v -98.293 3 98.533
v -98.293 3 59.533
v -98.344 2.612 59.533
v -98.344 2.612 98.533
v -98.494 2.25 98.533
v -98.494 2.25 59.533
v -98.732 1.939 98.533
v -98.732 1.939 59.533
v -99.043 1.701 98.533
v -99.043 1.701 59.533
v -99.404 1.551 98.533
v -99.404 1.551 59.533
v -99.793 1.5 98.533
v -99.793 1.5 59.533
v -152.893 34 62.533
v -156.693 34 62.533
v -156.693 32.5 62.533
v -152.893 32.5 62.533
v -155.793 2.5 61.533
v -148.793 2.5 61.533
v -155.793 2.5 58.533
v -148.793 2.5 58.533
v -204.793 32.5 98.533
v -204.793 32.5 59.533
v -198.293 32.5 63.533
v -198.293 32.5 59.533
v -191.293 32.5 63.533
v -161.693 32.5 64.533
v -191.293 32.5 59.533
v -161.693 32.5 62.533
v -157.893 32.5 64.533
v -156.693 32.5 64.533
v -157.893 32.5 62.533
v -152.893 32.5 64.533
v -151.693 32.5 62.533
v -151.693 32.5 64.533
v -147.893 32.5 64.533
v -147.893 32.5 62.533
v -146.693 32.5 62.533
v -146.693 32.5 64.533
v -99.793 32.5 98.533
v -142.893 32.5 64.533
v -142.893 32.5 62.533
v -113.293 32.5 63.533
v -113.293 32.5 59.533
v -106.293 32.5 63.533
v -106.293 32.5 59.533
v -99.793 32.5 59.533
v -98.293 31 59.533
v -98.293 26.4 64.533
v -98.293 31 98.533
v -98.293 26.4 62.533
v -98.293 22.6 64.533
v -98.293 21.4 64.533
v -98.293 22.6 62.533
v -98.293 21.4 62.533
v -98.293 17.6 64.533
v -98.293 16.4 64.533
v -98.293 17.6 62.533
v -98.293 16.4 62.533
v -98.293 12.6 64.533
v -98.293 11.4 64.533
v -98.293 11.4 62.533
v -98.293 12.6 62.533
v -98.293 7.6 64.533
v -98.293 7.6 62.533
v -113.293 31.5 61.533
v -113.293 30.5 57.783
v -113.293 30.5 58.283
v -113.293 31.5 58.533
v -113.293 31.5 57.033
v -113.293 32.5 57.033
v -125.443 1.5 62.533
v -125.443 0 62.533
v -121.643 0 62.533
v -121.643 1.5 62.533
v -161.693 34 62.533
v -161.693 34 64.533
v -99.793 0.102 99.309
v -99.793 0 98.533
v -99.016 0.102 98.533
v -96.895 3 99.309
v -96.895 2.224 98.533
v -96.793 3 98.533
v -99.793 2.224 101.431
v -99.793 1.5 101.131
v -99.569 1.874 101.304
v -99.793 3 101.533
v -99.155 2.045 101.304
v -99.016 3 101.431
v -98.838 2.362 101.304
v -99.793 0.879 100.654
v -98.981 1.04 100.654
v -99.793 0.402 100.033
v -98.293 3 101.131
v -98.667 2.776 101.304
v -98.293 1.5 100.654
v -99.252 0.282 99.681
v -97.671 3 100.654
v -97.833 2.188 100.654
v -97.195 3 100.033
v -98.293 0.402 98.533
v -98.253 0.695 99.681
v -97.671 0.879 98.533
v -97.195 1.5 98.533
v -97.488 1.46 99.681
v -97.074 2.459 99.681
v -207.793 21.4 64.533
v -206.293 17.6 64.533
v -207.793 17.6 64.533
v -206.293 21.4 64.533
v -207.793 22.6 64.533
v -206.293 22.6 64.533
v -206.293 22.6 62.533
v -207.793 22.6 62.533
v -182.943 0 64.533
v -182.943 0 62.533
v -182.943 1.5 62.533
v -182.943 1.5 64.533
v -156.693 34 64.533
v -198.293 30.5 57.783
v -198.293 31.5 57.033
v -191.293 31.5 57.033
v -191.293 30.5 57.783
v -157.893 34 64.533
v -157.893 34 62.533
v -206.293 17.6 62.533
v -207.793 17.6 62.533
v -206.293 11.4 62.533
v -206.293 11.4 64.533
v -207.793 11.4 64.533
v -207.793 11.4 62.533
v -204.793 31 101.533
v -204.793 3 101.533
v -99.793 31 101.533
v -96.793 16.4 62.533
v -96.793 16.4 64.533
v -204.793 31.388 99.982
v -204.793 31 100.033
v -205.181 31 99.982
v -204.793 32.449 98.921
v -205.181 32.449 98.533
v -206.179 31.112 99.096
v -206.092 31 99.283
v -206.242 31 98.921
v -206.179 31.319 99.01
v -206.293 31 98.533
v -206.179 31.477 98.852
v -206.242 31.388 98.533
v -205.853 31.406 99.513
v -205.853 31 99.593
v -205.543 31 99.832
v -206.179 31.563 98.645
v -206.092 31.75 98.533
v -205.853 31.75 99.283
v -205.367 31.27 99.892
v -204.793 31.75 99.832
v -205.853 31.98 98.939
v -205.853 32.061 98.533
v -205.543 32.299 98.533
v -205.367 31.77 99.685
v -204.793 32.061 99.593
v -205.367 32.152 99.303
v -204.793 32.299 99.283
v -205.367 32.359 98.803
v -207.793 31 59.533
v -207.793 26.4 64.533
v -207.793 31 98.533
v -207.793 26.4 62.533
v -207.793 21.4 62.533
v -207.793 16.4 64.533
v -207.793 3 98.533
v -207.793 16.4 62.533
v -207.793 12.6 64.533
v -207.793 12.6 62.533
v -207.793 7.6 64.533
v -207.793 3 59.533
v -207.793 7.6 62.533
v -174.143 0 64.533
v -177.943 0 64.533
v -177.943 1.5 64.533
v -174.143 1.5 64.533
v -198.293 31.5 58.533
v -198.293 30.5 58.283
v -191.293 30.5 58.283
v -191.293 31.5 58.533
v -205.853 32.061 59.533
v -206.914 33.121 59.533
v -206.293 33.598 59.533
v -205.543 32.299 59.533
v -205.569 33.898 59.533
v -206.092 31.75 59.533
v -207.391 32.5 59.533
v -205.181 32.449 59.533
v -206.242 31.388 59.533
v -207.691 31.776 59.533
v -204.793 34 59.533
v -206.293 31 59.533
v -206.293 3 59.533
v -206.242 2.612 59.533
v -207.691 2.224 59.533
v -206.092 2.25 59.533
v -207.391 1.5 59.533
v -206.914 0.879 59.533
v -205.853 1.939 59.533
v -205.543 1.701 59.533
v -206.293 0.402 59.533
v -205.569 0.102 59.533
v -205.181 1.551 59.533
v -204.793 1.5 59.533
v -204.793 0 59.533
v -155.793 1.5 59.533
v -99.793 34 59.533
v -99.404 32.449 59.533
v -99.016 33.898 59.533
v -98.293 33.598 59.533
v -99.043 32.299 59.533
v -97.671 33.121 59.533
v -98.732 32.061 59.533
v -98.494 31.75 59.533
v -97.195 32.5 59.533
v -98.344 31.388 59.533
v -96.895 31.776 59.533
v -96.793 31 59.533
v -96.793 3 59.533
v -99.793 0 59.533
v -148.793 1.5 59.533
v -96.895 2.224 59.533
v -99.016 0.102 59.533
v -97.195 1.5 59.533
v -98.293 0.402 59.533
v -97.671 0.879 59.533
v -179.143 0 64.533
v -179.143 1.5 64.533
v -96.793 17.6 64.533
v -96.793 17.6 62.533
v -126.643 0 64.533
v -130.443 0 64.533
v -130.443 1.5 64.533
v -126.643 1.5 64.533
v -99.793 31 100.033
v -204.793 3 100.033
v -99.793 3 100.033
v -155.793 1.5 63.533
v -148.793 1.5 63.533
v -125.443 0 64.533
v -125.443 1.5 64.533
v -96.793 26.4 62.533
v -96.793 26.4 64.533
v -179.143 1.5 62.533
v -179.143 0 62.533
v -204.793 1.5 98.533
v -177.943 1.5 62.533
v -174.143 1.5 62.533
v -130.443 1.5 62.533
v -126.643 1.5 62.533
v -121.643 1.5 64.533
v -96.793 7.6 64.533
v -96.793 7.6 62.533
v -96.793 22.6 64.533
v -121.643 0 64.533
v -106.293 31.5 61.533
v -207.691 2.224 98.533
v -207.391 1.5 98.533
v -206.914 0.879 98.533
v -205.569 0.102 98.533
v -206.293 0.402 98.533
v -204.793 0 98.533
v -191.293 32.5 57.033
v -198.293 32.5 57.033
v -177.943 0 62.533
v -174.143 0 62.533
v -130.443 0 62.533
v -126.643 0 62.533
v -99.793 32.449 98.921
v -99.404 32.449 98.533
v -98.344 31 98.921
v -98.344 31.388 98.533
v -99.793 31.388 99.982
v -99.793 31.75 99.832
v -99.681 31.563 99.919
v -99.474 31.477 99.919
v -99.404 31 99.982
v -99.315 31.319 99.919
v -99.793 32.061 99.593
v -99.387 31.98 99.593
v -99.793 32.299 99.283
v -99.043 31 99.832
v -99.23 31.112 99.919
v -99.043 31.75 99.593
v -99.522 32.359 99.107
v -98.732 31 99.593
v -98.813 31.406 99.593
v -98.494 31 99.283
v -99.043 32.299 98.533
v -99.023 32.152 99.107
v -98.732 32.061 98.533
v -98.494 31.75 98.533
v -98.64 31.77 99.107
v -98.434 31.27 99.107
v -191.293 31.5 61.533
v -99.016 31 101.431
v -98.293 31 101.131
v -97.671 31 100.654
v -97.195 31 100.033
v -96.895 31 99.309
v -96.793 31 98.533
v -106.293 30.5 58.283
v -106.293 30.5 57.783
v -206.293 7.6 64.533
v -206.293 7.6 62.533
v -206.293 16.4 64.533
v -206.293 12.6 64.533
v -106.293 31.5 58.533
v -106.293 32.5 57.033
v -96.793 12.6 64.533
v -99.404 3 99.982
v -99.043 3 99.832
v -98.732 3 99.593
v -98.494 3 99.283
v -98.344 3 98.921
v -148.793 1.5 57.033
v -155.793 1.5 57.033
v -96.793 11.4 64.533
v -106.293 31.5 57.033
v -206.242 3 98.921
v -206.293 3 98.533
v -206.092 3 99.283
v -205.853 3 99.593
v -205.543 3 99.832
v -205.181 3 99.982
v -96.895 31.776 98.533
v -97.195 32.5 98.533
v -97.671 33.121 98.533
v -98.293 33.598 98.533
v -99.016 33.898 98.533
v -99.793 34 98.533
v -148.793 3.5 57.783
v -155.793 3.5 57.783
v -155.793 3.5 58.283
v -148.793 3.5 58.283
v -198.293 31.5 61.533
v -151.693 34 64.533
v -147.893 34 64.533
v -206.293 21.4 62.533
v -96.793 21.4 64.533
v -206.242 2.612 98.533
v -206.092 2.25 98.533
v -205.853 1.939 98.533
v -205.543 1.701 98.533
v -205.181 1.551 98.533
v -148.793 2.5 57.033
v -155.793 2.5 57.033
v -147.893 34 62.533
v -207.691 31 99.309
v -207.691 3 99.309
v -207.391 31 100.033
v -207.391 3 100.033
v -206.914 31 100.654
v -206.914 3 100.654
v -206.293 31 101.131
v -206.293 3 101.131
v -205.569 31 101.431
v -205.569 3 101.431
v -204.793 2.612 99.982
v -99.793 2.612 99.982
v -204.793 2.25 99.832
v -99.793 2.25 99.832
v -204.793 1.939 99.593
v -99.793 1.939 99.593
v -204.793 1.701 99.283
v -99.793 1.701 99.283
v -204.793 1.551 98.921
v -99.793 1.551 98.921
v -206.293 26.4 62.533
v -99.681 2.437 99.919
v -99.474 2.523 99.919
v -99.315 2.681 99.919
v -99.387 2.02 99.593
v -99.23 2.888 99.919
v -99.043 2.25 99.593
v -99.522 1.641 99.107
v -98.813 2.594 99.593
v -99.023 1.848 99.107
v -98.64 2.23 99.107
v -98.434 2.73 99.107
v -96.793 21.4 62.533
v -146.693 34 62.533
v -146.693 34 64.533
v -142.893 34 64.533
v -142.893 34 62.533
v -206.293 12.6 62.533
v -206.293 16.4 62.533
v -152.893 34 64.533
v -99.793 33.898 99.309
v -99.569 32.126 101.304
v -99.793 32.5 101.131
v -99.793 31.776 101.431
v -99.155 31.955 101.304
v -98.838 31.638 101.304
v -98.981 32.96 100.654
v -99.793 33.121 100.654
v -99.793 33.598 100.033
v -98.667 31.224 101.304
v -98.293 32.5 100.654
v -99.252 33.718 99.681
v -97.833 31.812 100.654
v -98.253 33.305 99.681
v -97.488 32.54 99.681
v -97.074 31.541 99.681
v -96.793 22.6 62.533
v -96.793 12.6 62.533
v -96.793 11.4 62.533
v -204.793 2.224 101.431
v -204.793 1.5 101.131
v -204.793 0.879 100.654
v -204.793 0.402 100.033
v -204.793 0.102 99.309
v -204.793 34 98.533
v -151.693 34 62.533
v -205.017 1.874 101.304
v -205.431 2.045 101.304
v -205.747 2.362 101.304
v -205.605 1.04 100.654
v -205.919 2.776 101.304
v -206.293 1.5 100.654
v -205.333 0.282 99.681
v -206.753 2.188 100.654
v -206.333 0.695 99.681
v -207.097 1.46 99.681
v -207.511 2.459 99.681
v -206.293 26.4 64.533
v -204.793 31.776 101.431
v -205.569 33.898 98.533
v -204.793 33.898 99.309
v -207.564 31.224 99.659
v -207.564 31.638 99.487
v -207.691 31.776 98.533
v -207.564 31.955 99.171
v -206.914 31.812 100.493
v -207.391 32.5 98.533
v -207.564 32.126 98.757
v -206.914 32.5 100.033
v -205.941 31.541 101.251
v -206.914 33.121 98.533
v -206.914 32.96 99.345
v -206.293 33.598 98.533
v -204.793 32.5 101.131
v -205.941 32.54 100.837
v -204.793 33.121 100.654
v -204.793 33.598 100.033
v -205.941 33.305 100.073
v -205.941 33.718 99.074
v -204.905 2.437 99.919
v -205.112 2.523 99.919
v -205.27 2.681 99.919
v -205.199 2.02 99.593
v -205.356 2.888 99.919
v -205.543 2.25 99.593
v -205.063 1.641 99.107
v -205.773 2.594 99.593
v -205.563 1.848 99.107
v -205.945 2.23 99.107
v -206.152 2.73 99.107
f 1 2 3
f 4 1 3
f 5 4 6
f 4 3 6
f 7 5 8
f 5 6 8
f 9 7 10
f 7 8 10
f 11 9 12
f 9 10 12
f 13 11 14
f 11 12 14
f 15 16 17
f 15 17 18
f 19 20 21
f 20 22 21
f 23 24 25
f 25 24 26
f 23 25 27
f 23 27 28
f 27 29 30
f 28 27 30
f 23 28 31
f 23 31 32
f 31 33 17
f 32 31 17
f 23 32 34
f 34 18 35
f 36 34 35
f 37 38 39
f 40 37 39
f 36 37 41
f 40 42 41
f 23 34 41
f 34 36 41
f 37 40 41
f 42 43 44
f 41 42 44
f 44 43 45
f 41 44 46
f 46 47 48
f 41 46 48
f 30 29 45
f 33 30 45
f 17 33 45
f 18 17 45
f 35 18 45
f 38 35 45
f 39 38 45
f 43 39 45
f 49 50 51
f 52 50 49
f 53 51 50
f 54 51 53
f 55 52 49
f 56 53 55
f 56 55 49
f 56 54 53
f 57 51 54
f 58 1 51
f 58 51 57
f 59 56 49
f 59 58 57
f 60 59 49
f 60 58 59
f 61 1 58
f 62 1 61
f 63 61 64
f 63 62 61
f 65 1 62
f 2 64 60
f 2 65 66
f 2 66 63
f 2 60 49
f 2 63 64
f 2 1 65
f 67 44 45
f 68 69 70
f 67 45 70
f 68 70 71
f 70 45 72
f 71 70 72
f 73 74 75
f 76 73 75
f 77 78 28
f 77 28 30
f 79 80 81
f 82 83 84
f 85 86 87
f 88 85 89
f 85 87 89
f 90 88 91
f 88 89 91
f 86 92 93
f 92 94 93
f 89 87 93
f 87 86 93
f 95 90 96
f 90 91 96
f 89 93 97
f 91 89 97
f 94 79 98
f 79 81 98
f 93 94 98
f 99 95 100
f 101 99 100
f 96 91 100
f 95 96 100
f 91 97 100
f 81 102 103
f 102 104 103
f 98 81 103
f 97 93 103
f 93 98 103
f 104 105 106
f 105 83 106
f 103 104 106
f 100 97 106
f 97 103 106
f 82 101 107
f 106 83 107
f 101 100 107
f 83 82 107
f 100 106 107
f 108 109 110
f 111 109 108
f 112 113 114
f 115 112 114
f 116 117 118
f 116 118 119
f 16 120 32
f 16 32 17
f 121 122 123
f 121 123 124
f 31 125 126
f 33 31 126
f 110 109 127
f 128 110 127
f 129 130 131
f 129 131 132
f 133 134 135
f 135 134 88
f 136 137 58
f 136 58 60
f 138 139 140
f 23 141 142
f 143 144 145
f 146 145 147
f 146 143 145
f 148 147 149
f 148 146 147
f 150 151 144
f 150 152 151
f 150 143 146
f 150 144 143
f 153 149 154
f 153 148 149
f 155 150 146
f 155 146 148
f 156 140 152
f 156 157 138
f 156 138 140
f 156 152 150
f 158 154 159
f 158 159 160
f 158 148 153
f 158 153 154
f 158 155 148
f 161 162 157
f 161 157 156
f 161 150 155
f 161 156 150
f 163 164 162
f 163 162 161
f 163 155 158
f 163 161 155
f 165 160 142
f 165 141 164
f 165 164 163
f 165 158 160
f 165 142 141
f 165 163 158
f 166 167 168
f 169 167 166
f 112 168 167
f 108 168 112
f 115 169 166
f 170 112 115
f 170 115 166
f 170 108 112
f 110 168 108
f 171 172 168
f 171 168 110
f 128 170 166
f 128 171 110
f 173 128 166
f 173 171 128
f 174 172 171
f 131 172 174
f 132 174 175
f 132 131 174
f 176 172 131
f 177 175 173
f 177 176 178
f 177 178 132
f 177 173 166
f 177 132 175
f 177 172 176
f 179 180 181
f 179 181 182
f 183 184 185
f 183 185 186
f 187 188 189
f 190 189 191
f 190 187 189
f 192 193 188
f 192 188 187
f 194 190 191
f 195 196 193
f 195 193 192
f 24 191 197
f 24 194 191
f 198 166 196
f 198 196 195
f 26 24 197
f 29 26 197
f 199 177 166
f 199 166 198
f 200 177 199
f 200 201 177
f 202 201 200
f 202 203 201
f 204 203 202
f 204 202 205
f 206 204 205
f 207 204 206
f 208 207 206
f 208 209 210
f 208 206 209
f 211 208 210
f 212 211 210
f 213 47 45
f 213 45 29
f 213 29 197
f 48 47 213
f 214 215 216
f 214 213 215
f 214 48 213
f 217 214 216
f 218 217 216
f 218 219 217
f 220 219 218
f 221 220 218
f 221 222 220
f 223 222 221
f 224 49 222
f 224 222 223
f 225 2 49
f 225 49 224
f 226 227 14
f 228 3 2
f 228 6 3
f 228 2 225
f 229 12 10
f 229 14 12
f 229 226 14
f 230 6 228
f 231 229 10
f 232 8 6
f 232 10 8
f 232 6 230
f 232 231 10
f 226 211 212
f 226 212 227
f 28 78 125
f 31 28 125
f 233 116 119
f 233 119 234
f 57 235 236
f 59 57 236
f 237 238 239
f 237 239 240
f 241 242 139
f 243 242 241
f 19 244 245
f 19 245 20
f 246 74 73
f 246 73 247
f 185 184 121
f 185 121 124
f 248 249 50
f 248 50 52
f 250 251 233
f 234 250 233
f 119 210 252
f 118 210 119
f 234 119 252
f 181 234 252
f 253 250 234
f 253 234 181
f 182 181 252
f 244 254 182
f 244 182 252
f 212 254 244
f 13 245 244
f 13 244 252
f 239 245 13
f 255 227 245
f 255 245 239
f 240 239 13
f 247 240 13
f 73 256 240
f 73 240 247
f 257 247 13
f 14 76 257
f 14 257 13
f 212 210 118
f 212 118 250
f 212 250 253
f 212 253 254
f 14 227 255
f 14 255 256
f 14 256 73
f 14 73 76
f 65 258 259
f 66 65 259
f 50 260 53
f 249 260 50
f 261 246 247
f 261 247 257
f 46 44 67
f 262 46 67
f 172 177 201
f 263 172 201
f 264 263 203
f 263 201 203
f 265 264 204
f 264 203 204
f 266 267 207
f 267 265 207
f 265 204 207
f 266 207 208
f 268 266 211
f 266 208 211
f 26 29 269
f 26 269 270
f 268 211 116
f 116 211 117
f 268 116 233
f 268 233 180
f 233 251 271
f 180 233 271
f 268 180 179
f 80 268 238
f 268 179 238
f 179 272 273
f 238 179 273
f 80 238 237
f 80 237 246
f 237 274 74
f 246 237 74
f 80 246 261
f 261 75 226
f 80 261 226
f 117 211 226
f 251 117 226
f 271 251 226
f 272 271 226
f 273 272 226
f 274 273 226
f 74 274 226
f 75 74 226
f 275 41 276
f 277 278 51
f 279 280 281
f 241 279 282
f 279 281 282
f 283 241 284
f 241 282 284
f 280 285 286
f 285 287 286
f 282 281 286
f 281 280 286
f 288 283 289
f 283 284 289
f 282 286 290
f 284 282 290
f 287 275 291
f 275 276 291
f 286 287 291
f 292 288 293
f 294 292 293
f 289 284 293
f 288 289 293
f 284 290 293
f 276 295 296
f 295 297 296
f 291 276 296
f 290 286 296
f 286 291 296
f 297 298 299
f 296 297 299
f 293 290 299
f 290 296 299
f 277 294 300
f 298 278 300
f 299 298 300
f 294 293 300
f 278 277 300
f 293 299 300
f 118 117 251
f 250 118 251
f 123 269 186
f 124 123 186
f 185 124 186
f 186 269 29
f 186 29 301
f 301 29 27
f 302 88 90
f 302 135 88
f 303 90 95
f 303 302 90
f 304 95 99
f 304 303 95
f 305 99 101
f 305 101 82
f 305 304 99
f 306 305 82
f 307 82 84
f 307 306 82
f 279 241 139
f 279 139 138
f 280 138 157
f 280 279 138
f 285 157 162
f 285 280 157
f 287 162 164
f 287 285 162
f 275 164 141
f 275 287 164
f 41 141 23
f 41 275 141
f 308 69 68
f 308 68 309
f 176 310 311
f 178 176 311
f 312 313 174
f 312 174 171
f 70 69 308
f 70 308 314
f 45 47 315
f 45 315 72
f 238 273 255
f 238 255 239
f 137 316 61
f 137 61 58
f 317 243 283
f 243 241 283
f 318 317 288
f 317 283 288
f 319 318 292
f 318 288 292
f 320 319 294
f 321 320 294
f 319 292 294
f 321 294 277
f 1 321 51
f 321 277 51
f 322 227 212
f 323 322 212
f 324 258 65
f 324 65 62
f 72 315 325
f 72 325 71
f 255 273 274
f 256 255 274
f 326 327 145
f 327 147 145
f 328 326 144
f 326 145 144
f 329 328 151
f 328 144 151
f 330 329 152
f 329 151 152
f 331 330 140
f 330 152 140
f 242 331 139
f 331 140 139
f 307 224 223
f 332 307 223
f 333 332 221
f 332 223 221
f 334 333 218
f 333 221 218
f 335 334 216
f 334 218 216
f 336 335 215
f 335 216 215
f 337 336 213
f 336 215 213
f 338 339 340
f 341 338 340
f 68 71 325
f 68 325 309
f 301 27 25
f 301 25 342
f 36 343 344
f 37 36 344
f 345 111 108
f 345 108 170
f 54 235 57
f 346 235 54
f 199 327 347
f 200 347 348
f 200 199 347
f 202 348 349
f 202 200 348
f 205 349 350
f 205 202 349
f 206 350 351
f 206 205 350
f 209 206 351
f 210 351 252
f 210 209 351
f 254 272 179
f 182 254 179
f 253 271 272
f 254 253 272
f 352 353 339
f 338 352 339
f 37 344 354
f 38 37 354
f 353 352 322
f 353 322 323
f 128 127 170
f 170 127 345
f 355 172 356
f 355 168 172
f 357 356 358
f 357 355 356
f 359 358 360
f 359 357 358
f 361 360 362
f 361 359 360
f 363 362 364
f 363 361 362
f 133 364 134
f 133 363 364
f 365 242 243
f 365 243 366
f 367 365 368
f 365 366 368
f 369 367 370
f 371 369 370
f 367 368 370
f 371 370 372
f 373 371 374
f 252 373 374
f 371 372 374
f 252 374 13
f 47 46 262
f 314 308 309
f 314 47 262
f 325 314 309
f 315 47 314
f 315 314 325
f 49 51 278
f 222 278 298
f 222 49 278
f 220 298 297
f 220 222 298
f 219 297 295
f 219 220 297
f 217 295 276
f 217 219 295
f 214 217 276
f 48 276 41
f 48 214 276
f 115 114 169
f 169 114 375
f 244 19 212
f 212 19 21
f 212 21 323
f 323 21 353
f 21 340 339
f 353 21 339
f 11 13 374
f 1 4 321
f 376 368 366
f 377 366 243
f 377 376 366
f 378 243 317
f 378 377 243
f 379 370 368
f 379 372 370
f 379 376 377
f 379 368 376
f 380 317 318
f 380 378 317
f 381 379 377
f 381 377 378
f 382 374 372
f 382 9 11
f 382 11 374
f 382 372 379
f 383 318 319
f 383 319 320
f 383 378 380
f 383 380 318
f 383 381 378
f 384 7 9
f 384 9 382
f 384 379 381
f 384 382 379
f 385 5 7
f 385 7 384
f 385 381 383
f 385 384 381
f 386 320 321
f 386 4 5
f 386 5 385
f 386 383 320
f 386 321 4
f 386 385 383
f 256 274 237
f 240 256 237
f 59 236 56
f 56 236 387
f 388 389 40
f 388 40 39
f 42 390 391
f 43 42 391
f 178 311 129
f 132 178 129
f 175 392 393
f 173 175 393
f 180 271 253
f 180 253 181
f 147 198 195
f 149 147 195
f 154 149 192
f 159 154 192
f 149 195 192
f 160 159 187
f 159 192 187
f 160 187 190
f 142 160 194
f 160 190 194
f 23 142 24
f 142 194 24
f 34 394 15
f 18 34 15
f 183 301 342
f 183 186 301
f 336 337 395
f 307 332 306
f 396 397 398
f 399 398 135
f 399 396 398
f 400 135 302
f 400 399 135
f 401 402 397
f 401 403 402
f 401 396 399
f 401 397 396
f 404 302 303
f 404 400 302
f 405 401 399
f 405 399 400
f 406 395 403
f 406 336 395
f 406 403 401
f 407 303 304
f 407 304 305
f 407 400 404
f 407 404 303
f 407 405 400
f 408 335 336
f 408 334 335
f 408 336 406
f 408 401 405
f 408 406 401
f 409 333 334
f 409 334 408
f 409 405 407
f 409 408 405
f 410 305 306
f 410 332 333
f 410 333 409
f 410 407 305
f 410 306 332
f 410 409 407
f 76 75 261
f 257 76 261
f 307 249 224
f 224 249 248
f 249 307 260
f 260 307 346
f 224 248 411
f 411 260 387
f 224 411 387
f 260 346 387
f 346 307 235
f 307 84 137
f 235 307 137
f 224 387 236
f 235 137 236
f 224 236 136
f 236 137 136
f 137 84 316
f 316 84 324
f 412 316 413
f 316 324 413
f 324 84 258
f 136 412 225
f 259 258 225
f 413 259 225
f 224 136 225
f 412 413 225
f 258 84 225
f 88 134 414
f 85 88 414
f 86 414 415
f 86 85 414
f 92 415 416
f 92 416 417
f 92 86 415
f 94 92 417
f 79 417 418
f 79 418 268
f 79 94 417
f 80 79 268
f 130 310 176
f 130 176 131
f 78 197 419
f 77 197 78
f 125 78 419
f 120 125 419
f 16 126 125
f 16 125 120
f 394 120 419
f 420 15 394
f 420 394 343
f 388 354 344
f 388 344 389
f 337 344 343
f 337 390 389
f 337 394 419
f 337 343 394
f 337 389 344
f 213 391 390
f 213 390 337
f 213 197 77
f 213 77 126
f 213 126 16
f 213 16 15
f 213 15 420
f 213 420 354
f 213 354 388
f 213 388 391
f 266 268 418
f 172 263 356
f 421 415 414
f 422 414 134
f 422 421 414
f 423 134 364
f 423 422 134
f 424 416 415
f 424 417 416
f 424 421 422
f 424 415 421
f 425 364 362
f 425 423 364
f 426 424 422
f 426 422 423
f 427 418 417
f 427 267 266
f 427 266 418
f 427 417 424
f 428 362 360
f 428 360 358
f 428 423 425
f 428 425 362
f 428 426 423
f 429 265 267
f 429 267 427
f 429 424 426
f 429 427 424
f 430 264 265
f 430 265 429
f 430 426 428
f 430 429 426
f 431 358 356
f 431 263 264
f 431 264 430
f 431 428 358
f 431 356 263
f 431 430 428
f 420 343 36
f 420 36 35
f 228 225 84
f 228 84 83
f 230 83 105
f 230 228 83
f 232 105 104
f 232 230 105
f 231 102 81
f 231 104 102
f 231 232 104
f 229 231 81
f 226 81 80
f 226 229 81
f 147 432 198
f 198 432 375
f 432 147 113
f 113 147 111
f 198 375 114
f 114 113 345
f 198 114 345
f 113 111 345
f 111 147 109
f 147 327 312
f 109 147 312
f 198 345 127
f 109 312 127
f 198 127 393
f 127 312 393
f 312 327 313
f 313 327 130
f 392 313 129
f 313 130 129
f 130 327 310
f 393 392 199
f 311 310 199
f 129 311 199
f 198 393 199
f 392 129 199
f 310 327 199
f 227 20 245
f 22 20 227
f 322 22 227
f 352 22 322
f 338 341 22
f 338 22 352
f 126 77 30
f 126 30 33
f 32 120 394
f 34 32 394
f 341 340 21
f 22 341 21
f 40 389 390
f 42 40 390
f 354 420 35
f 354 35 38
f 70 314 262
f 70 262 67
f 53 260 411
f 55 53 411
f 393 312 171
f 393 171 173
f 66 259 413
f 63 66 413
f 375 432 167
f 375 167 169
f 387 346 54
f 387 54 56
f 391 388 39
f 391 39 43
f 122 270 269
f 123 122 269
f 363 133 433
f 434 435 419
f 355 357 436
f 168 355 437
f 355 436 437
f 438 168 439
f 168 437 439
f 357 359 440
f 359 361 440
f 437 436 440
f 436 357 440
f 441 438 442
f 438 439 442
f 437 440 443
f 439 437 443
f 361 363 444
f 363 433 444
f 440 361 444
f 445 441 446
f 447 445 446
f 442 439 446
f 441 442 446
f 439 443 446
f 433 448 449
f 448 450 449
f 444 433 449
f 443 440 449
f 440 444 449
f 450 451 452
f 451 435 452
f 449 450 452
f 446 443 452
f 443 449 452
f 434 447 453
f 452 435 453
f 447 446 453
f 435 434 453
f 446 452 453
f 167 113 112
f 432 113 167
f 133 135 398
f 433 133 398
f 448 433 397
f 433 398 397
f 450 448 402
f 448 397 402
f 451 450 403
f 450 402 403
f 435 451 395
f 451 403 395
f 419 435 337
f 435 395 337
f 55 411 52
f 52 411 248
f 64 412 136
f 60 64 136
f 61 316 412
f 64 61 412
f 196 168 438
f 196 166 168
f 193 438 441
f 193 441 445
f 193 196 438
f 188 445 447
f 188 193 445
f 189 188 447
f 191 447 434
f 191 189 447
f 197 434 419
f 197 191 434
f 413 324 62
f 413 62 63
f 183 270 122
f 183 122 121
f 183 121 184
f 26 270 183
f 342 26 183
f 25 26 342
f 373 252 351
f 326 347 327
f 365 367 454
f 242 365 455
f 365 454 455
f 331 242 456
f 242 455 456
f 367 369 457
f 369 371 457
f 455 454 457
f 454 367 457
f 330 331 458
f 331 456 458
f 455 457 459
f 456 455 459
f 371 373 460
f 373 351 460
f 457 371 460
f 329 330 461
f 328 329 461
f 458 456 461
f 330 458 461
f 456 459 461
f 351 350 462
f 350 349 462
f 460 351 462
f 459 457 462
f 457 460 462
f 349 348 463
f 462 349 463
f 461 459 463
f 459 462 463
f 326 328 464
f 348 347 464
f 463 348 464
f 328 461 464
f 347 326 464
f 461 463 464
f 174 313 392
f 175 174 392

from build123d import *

# Parameters (mm, degrees)
SKETCH1_W             = 111
SKETCH1_H             = 42
BOSS_EXTRUDE1_DEPTH   = 34
FILLET1_R             = 3
SHELL1_T              = -1.5
SKETCH2_W             = 7
SKETCH2_H             = 1
BOSS_EXTRUDE2_DEPTH   = 2.5
BOSS_EXTRUDE2_2_DEPTH = 2.5
BOSS_EXTRUDE2_3_DEPTH = 2.5
SKETCH3_W             = 7
SKETCH3_H             = 1
BOSS_EXTRUDE3_DEPTH   = 4.5
BOSS_EXTRUDE4_DEPTH   = 7
BOSS_EXTRUDE5_DEPTH   = 7
BOSS_EXTRUDE6_DEPTH   = 7
SKETCH7_W             = 7
SKETCH7_H             = 1.5
BOSS_EXTRUDE7_DEPTH   = 1
CUT_EXTRUDE1_REACH    = 149.537
BOSS_EXTRUDE8_DEPTH   = 7
CUT_EXTRUDE3_REACH    = 156.227
SKETCH10_W            = 2
SKETCH10_H            = 3.8
SKETCH11_W            = 3.8
SKETCH11_H            = 2
CUT_EXTRUDE4_DEPTH    = 1.5
SKETCH12_W            = 3.8
SKETCH12_H            = 2
CUT_EXTRUDE5_DEPTH    = 1.5


with BuildPart() as part:
    # Sketch1 → Boss-Extrude1 (new body)
    with BuildSketch(Plane(origin=(0, 0, 0), x_dir=(1, 0, 0), z_dir=(0, 1, 0))):
        with Locations((-152.292726369, -80.532812689)):
            Rectangle(SKETCH1_W, SKETCH1_H)
    extrude(amount=BOSS_EXTRUDE1_DEPTH)

    # Fillet1
    fillet1_edges = [part.edges().sort_by_distance(p)[0] for p in [
        (-96.792726369, 34, 80.532812689),
        (-152.292726369, 34, 101.532812689),
        (-96.792726369, 0, 80.532812689),
        (-207.792726369, 0, 80.532812689),
        (-152.292726369, 0, 101.532812689),
        (-96.792726369, 17, 101.532812689),
        (-207.792726369, 17, 101.532812689),
        (-207.792726369, 34, 80.532812689),
    ]]
    fillet(fillet1_edges, radius=FILLET1_R)

    # Shell1
    shell1_openings = [part.faces().sort_by_distance(p)[0] for p in [
        (-152.292726369, 17, 59.532812689),
    ]]
    offset(amount=SHELL1_T, openings=shell1_openings, kind=Kind.INTERSECTION)



with BuildPart() as body_2:
    # Sketch2 → Boss-Extrude2 (new body)
    with BuildSketch(Plane(origin=(0, 0, 59.532812689), x_dir=(-1, 0, 0), z_dir=(0, 0, -1))):
        with Locations((109.792726369, 32)):
            Rectangle(SKETCH2_W, SKETCH2_H)
    extrude(amount=BOSS_EXTRUDE2_DEPTH)


with BuildPart() as body_3:
    # Sketch2 → Boss-Extrude2 2 (new body)
    with BuildSketch(Plane(origin=(0, 0, 59.532812689), x_dir=(-1, 0, 0), z_dir=(0, 0, -1))):
        with Locations((194.792726369, 32)):
            Rectangle(SKETCH2_W, SKETCH2_H)
    extrude(amount=BOSS_EXTRUDE2_2_DEPTH)


with BuildPart() as body_4:
    # Sketch2 → Boss-Extrude2 3 (new body)
    with BuildSketch(Plane(origin=(0, 0, 59.532812689), x_dir=(-1, 0, 0), z_dir=(0, 0, -1))):
        with Locations((152.292726369, 2)):
            Rectangle(SKETCH2_W, SKETCH2_H)
    extrude(amount=BOSS_EXTRUDE2_3_DEPTH)


with BuildPart() as part_1:
    add(part.part)

    add(body_2.part)  # Boss-Extrude3 merges body 2

    add(body_3.part)  # Boss-Extrude3 merges body 3

    add(body_4.part)  # Boss-Extrude3 merges body 4
    # Sketch3 → Boss-Extrude3 (add)
    with BuildSketch(Plane(origin=(0, 0, 57.032812689), x_dir=(-1, 0, 0), z_dir=(0, 0, -1))):
        with Locations((194.792726369, 32)):
            Rectangle(SKETCH3_W, SKETCH3_H)
        with Locations((109.792726369, 32)):
            Rectangle(SKETCH3_W, SKETCH3_H)
        with Locations((152.292726369, 2)):
            Rectangle(SKETCH3_W, SKETCH3_H)
    extrude(amount=-BOSS_EXTRUDE3_DEPTH)

    # Sketch4 → Boss-Extrude4 (add)
    with BuildSketch(Plane.ZY.offset(113.292726369)):
        Polygon((61.532812689, 31.5), (61.532812689, 32.5), (63.532812689, 32.5), align=None)
    extrude(amount=-BOSS_EXTRUDE4_DEPTH)

    # Sketch5 → Boss-Extrude5 (add)
    with BuildSketch(Plane(origin=(-191.292726369, 0, 0), x_dir=(0, 0, -1), z_dir=(1, 0, 0))):
        Polygon((-61.532812689, 31.5), (-61.532812689, 32.5), (-63.532812689, 32.5), align=None)
    extrude(amount=-BOSS_EXTRUDE5_DEPTH)

    # Sketch6 → Boss-Extrude6 (add)
    with BuildSketch(Plane.ZY.offset(155.792726369)):
        Polygon((61.532812689, 2.5), (61.532812689, 1.5), (63.532812689, 1.5), align=None)
    extrude(amount=-BOSS_EXTRUDE6_DEPTH)

    # Sketch7 → Boss-Extrude7 (add)
    with BuildSketch(Plane.XZ.offset(-31.5)):
        with Locations((-194.792726369, 57.782812689)):
            Rectangle(SKETCH7_W, SKETCH7_H)
        with Locations((-109.792726369, 57.782812689)):
            Rectangle(SKETCH7_W, SKETCH7_H)
    extrude(amount=BOSS_EXTRUDE7_DEPTH)

    # Cut-Extrude1: up to this face of the body (flat: up to its plane)
    cut_extrude1_end = Plane(part_1.part.faces().sort_by_distance((-106.292726369, 31.80952381, 59.378050785))[0])
    # Sketch8 → Cut-Extrude1 (cut, up to the picked face)
    with BuildSketch(Plane.ZY.offset(198.292726369), mode=Mode.PRIVATE) as cut_extrude1_sk1:
        Polygon((57.032812689, 31.5), (57.782812689, 30.5), (57.032812689, 30.5), align=None)
    cut_extrude1_tool1 = split(extrude(cut_extrude1_sk1.sketch, amount=-CUT_EXTRUDE1_REACH, mode=Mode.PRIVATE), bisect_by=cut_extrude1_end, keep=Keep.BOTH, mode=Mode.PRIVATE)
    # Sketch8 → Cut-Extrude1 (cut, up to the picked face)
    with BuildSketch(Plane.ZY.offset(198.292726369), mode=Mode.PRIVATE) as cut_extrude1_sk2:
        Polygon((58.282812689, 30.5), (58.532812689, 31.5), (58.532812689, 30.5), align=None)
    cut_extrude1_tool2 = split(extrude(cut_extrude1_sk2.sketch, amount=-CUT_EXTRUDE1_REACH, mode=Mode.PRIVATE), bisect_by=cut_extrude1_end, keep=Keep.BOTH, mode=Mode.PRIVATE)
    add(cut_extrude1_tool1.solids().sort_by(Axis((-198.292726, 30.833333, 57.282813), (1, 0, 0)))[0], mode=Mode.SUBTRACT)
    add(cut_extrude1_tool2.solids().sort_by(Axis((-198.292726, 30.833333, 58.449479), (1, 0, 0)))[0], mode=Mode.SUBTRACT)

    # Sketch9 → Boss-Extrude8 (add)
    with BuildSketch(Plane.ZY.offset(155.792726369)):
        Polygon((57.032812689, 2.5), (57.782812689, 3.5), (58.282812689, 3.5), (58.532812689, 2.5), align=None)
    extrude(amount=-BOSS_EXTRUDE8_DEPTH)

    # Cut-Extrude3: up to this face of the body (flat: up to its plane)
    cut_extrude3_end = Plane(part_1.part.faces().sort_by_distance((-207.792726369, 17, 79.032812689))[0])
    # Sketch10 → Cut-Extrude3 (cut, up to the picked face)
    with BuildSketch(Plane(origin=(-96.792726369, 0, 0), x_dir=(0, 0, -1), z_dir=(1, 0, 0)), mode=Mode.PRIVATE) as cut_extrude3_sk1:
        with Locations((-63.532812689, 24.5)):
            Rectangle(SKETCH10_W, SKETCH10_H)
    cut_extrude3_tool1 = split(extrude(cut_extrude3_sk1.sketch, amount=-CUT_EXTRUDE3_REACH, mode=Mode.PRIVATE), bisect_by=cut_extrude3_end, keep=Keep.BOTH, mode=Mode.PRIVATE)
    # Sketch10 → Cut-Extrude3 (cut, up to the picked face)
    with BuildSketch(Plane(origin=(-96.792726369, 0, 0), x_dir=(0, 0, -1), z_dir=(1, 0, 0)), mode=Mode.PRIVATE) as cut_extrude3_sk2:
        with Locations((-63.532812689, 19.5)):
            Rectangle(SKETCH10_W, SKETCH10_H)
    cut_extrude3_tool2 = split(extrude(cut_extrude3_sk2.sketch, amount=-CUT_EXTRUDE3_REACH, mode=Mode.PRIVATE), bisect_by=cut_extrude3_end, keep=Keep.BOTH, mode=Mode.PRIVATE)
    # Sketch10 → Cut-Extrude3 (cut, up to the picked face)
    with BuildSketch(Plane(origin=(-96.792726369, 0, 0), x_dir=(0, 0, -1), z_dir=(1, 0, 0)), mode=Mode.PRIVATE) as cut_extrude3_sk3:
        with Locations((-63.532812689, 14.5)):
            Rectangle(SKETCH10_W, SKETCH10_H)
    cut_extrude3_tool3 = split(extrude(cut_extrude3_sk3.sketch, amount=-CUT_EXTRUDE3_REACH, mode=Mode.PRIVATE), bisect_by=cut_extrude3_end, keep=Keep.BOTH, mode=Mode.PRIVATE)
    # Sketch10 → Cut-Extrude3 (cut, up to the picked face)
    with BuildSketch(Plane(origin=(-96.792726369, 0, 0), x_dir=(0, 0, -1), z_dir=(1, 0, 0)), mode=Mode.PRIVATE) as cut_extrude3_sk4:
        with Locations((-63.532812689, 9.5)):
            Rectangle(SKETCH10_W, SKETCH10_H)
    cut_extrude3_tool4 = split(extrude(cut_extrude3_sk4.sketch, amount=-CUT_EXTRUDE3_REACH, mode=Mode.PRIVATE), bisect_by=cut_extrude3_end, keep=Keep.BOTH, mode=Mode.PRIVATE)
    add(cut_extrude3_tool1.solids().sort_by(Axis((-96.792726, 24.5, 63.532813), (-1, 0, 0)))[0], mode=Mode.SUBTRACT)
    add(cut_extrude3_tool2.solids().sort_by(Axis((-96.792726, 19.5, 63.532813), (-1, 0, 0)))[0], mode=Mode.SUBTRACT)
    add(cut_extrude3_tool3.solids().sort_by(Axis((-96.792726, 14.5, 63.532813), (-1, 0, 0)))[0], mode=Mode.SUBTRACT)
    add(cut_extrude3_tool4.solids().sort_by(Axis((-96.792726, 9.5, 63.532813), (-1, 0, 0)))[0], mode=Mode.SUBTRACT)

    # Sketch11 → Cut-Extrude4 (cut)
    with BuildSketch(Plane(origin=(0, 34, 0), x_dir=(1, 0, 0), z_dir=(0, 1, 0))):
        with Locations((-159.792726369, -63.532812689)):
            Rectangle(SKETCH11_W, SKETCH11_H)
        with Locations((-154.792726369, -63.532812689)):
            Rectangle(SKETCH11_W, SKETCH11_H)
        with Locations((-149.792726369, -63.532812689)):
            Rectangle(SKETCH11_W, SKETCH11_H)
        with Locations((-144.792726369, -63.532812689)):
            Rectangle(SKETCH11_W, SKETCH11_H)
    extrude(amount=-CUT_EXTRUDE4_DEPTH, mode=Mode.SUBTRACT)

    # Sketch12 → Cut-Extrude5 (cut)
    with BuildSketch(Plane.XZ):
        with Locations((-123.542726369, 63.532812689)):
            Rectangle(SKETCH12_W, SKETCH12_H)
        with Locations((-128.542726369, 63.532812689)):
            Rectangle(SKETCH12_W, SKETCH12_H)
        with Locations((-176.042726369, 63.532812689)):
            Rectangle(SKETCH12_W, SKETCH12_H)
        with Locations((-181.042726369, 63.532812689)):
            Rectangle(SKETCH12_W, SKETCH12_H)
    extrude(amount=-CUT_EXTRUDE5_DEPTH, mode=Mode.SUBTRACT)


solid = part_1.part
